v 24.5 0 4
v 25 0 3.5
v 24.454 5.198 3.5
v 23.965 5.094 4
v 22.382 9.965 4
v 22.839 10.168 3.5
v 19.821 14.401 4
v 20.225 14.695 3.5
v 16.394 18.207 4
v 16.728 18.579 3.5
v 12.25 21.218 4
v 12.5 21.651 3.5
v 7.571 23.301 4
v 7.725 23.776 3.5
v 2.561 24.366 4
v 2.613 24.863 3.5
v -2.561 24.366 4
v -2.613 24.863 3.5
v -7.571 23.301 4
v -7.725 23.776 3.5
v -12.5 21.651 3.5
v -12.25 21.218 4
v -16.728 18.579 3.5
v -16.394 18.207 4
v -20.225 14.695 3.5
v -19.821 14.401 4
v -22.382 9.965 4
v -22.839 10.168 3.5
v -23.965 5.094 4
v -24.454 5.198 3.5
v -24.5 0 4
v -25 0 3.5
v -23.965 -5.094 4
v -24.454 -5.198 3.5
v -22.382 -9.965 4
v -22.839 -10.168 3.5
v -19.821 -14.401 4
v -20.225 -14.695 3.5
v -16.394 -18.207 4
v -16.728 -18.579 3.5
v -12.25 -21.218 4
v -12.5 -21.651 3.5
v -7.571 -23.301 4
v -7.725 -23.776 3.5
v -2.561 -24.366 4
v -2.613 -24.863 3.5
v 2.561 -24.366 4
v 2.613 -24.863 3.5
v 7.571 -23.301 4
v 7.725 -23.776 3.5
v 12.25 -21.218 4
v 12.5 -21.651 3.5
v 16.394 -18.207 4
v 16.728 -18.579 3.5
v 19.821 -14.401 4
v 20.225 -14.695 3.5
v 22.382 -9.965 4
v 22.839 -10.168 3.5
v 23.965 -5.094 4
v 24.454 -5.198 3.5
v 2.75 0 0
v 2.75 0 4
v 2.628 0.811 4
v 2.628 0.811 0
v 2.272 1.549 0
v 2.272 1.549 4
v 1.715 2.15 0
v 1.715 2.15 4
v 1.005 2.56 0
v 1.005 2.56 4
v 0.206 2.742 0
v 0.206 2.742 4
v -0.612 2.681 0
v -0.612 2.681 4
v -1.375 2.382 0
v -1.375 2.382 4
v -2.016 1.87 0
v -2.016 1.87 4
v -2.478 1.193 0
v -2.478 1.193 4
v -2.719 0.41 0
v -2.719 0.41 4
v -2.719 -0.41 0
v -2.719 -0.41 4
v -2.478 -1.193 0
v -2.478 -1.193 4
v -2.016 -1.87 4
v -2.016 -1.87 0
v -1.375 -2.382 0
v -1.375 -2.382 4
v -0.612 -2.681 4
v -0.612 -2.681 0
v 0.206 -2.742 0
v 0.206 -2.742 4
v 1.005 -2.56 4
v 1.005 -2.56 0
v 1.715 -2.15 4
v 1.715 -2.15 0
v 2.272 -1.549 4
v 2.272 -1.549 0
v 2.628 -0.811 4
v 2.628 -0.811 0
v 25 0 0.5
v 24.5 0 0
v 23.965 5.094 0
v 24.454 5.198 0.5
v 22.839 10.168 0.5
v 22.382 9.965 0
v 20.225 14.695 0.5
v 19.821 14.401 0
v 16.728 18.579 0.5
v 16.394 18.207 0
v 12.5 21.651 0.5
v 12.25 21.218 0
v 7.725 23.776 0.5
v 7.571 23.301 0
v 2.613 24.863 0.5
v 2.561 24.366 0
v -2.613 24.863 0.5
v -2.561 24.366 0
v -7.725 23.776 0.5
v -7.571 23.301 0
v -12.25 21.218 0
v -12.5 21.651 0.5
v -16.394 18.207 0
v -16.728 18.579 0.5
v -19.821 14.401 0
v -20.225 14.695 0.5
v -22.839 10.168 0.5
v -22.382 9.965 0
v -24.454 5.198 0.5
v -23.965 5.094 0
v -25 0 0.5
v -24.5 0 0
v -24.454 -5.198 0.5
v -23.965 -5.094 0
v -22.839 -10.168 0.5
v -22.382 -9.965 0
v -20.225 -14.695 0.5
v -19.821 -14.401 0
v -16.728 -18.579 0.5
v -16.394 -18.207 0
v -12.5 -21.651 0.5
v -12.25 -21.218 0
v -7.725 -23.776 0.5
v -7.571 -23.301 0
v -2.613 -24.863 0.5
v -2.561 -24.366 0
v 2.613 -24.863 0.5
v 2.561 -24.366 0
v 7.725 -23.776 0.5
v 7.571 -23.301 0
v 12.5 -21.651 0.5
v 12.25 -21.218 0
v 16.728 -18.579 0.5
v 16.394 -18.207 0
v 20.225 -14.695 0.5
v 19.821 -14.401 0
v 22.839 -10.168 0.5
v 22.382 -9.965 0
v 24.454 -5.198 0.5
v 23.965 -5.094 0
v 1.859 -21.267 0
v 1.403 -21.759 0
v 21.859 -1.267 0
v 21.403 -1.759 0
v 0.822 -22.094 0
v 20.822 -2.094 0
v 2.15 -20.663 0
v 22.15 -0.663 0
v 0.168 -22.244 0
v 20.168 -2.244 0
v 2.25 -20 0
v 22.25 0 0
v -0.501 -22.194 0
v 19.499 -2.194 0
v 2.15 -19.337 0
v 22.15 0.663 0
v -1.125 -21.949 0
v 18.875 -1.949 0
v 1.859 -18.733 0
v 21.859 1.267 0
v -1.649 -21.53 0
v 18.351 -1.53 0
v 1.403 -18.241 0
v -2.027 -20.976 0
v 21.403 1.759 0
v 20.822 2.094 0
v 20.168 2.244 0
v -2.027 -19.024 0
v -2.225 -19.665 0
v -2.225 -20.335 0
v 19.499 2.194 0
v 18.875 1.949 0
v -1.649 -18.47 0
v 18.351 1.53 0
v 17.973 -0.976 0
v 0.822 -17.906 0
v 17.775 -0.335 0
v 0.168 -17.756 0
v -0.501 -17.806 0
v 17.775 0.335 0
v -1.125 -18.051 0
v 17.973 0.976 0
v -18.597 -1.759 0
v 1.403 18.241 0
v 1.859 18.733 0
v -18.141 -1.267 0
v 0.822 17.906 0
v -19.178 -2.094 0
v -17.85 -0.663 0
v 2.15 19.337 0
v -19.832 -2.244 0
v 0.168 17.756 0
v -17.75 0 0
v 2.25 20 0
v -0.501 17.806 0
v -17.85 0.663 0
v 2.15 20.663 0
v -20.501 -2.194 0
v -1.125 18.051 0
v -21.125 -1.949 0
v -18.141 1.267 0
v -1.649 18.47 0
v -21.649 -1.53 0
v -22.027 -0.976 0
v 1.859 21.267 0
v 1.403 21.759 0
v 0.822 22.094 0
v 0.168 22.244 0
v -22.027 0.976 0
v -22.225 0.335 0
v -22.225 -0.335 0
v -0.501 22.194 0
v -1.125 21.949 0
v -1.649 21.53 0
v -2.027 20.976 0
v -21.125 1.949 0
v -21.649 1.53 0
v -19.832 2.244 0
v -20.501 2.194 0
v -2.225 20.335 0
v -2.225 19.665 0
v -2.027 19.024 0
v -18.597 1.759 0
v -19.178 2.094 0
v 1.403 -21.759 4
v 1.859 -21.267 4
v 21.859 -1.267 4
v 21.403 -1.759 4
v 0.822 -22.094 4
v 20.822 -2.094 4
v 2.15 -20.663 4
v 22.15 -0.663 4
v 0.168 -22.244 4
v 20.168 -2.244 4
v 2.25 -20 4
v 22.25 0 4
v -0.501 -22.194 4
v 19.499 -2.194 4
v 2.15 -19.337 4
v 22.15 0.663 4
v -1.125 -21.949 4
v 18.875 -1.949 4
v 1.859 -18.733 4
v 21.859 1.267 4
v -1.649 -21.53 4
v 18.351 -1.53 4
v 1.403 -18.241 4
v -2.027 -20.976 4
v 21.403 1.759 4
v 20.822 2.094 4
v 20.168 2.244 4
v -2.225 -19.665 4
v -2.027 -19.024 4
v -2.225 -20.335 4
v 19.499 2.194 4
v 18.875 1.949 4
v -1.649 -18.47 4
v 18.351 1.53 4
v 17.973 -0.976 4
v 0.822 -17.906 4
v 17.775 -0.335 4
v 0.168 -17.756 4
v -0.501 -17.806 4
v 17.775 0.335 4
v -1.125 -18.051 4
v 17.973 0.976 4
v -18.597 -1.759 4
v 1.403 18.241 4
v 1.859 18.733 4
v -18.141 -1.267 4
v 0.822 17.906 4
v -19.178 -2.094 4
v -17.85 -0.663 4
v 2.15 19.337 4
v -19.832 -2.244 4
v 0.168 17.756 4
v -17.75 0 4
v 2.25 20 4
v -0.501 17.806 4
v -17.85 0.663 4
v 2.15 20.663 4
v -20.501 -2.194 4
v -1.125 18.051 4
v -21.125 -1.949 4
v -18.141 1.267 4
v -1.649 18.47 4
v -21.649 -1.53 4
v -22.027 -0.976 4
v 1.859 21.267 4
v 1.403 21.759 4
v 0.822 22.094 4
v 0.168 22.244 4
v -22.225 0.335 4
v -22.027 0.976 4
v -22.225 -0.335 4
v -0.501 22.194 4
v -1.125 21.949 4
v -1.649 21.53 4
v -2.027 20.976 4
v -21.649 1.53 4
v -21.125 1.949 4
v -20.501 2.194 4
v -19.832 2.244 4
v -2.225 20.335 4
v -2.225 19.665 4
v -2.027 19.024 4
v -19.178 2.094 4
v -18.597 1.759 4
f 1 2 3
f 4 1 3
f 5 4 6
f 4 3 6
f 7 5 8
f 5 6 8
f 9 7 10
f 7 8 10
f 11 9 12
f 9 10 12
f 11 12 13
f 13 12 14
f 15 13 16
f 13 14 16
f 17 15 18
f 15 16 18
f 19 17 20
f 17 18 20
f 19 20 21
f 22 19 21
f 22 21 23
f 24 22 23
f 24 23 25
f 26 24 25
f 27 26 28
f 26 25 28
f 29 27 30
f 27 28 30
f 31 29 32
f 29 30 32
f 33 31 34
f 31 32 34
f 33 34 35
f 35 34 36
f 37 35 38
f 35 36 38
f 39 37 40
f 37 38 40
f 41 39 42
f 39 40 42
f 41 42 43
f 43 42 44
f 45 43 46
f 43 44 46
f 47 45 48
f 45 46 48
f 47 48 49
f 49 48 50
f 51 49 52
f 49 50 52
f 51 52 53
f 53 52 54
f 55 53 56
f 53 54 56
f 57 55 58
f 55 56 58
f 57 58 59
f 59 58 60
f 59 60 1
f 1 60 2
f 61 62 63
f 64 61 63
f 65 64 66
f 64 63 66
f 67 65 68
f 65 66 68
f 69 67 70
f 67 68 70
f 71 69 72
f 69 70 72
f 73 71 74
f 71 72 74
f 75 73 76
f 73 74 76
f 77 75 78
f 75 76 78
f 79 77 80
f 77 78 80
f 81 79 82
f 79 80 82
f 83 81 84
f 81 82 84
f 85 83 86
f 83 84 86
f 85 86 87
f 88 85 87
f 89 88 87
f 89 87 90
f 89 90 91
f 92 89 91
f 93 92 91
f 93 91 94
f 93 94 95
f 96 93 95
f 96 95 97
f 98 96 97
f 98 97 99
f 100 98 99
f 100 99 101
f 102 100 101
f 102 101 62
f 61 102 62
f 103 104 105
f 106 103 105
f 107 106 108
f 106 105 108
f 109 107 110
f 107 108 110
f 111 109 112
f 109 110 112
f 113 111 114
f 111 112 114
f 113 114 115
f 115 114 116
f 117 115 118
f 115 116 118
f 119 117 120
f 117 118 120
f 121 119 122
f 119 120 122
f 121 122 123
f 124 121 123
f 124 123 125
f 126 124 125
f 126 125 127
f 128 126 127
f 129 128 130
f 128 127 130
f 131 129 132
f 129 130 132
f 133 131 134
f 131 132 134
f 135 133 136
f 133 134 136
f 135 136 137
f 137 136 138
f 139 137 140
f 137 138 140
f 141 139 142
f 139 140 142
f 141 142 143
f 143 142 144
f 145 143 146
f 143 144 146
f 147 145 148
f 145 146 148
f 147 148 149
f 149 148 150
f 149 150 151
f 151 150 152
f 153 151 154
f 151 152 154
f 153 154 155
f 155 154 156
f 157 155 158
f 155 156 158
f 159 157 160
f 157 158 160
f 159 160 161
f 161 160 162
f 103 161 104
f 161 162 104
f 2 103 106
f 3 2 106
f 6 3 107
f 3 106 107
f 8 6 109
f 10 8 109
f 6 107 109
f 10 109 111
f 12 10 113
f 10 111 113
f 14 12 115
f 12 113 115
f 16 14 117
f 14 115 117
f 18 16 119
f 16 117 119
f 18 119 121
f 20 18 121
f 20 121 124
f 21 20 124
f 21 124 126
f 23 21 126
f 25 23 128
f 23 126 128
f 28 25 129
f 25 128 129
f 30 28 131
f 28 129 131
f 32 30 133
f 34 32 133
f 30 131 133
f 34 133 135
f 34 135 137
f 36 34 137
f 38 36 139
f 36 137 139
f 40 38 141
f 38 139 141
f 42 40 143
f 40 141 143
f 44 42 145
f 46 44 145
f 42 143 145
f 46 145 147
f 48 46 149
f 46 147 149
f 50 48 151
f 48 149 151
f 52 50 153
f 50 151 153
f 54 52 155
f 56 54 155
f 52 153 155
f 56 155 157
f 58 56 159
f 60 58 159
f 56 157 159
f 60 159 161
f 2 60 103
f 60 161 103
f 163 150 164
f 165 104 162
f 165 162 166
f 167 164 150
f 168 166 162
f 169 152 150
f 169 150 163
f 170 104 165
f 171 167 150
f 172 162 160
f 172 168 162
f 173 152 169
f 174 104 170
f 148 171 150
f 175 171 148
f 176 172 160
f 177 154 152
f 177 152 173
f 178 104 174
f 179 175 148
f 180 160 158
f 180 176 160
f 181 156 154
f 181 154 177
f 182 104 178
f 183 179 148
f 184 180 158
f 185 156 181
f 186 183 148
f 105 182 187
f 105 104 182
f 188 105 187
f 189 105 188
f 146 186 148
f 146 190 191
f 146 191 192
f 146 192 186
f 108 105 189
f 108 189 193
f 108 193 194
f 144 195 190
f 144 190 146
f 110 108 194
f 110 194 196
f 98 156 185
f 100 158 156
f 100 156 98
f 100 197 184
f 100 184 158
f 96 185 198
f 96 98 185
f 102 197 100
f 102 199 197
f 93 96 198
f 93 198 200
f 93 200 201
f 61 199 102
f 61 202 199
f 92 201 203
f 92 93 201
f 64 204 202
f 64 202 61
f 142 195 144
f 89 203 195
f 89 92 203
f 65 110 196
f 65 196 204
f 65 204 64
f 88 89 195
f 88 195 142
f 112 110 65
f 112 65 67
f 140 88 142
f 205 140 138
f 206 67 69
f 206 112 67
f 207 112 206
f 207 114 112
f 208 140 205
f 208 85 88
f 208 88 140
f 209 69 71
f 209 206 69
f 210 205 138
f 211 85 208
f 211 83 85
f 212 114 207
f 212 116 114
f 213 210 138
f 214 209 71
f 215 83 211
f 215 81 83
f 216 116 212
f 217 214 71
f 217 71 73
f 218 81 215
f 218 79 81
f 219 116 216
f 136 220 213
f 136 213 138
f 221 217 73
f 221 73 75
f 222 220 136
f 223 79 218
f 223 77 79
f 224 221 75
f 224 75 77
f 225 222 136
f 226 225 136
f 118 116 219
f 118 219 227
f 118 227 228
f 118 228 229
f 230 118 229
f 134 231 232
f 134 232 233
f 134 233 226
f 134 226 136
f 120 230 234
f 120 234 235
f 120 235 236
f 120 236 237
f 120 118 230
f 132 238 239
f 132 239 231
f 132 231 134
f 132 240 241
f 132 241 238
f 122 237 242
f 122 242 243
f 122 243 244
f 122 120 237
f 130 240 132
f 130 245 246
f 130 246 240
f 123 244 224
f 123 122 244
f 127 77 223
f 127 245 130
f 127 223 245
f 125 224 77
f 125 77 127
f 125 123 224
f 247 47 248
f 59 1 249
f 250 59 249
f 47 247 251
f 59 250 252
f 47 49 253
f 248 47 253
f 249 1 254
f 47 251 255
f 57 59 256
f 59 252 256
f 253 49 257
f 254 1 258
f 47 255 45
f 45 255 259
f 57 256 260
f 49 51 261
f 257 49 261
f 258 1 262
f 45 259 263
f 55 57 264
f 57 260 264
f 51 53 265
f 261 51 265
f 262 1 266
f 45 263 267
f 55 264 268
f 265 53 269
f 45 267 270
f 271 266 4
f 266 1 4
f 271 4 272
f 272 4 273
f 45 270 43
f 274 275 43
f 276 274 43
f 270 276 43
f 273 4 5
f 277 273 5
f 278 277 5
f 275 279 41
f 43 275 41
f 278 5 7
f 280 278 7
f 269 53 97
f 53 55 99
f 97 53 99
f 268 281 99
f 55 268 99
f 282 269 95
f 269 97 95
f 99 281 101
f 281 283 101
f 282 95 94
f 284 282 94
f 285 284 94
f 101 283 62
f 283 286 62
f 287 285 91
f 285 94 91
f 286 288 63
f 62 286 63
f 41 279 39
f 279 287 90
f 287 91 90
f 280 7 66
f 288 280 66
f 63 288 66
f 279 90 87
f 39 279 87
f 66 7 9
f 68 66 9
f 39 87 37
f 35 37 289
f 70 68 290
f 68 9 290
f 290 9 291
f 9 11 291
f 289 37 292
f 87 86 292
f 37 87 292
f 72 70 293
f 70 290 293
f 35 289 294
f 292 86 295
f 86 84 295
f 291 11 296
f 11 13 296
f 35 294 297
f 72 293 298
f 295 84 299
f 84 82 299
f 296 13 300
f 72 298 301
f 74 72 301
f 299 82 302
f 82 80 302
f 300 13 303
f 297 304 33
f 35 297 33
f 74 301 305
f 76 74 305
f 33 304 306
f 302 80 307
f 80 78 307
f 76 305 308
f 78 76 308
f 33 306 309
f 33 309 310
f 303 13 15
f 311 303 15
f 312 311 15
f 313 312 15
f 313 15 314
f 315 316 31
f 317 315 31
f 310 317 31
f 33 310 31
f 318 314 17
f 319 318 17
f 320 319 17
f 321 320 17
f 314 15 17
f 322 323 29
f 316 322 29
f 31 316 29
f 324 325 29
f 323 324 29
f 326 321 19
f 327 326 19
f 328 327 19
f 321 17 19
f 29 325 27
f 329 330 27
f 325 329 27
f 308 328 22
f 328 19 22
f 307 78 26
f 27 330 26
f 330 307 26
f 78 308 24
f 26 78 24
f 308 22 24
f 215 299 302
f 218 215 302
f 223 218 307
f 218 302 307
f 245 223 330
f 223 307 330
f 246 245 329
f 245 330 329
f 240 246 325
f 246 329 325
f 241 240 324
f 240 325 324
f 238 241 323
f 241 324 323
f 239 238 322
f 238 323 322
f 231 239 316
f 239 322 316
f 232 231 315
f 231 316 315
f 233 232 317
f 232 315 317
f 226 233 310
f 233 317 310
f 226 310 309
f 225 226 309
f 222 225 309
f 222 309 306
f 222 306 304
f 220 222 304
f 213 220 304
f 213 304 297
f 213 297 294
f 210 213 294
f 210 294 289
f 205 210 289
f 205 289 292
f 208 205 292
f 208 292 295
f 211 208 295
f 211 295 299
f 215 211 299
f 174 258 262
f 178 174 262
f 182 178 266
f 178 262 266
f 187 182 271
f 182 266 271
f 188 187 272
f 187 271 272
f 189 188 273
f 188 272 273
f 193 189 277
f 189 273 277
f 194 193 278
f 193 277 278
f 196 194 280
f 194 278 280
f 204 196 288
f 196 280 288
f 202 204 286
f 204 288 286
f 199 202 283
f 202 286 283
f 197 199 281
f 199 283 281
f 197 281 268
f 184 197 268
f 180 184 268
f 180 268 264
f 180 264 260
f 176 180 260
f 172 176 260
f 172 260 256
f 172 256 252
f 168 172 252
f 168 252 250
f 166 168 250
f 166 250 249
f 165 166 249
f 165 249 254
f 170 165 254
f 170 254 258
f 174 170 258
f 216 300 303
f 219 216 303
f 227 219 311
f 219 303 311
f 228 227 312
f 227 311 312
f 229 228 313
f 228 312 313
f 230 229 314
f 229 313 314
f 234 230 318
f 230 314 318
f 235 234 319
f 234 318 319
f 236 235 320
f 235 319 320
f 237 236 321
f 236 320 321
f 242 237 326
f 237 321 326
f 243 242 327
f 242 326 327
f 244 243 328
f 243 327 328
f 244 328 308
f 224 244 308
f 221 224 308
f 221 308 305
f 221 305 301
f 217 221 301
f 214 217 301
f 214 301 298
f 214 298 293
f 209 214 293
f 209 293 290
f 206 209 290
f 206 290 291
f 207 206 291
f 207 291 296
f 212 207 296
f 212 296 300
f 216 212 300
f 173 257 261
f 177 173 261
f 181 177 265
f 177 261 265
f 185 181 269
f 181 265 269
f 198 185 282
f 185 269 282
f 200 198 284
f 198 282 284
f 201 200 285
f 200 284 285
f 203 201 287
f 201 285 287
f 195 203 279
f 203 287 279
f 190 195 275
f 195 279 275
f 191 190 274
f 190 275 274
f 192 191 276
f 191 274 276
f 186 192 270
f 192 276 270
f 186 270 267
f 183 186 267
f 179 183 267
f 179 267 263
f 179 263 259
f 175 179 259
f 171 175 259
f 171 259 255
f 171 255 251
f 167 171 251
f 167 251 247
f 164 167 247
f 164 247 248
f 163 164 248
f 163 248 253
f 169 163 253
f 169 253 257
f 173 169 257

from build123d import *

# Parameters (mm, degrees)
SKETCH_1_W              = 25
SKETCH_1_H              = 4
HOLE_WIZARD_5_5_5_5_1_D = 5.5
HOLE_WIZARD_4_5_4_5_1_D = 4.5
CHAMFER_1_SIZE          = 0.5


with BuildPart() as part:
    # 草图1 → 旋转1 (revolve)
    with BuildSketch(Plane(origin=(0, 0, 0), x_dir=(1, 0, 0), z_dir=(0, 1, 0))):
        with Locations((12.5, -2)):
            Rectangle(SKETCH_1_W, SKETCH_1_H)
    revolve(axis=Axis((0, 0, 0), (0, 0, 1)))

    # Ø5.5 (5.5) 直径孔1 (through all)
    with Locations(Plane(origin=(0, 0, 0), x_dir=(-1, 0, 0), z_dir=(0, 0, -1))):
        with Locations((0, 0)):
            Hole(HOLE_WIZARD_5_5_5_5_1_D / 2)

    # Ø4.5 (4.5) 直径孔1 (through all)
    with Locations(Plane(origin=(0, 0, 0), x_dir=(-1, 0, 0), z_dir=(0, 0, -1))):
        with Locations((0, 20), (-20, 0), (0, -20), (20, 0)):
            Hole(HOLE_WIZARD_4_5_4_5_1_D / 2)

    # 倒角1
    chamfer_1_edges = [part.edges().sort_by_distance(p)[0] for p in [
        (-25, 0, 4),
        (-25, 0, 0),
    ]]
    chamfer(chamfer_1_edges, length=CHAMFER_1_SIZE)


solid = part.part
